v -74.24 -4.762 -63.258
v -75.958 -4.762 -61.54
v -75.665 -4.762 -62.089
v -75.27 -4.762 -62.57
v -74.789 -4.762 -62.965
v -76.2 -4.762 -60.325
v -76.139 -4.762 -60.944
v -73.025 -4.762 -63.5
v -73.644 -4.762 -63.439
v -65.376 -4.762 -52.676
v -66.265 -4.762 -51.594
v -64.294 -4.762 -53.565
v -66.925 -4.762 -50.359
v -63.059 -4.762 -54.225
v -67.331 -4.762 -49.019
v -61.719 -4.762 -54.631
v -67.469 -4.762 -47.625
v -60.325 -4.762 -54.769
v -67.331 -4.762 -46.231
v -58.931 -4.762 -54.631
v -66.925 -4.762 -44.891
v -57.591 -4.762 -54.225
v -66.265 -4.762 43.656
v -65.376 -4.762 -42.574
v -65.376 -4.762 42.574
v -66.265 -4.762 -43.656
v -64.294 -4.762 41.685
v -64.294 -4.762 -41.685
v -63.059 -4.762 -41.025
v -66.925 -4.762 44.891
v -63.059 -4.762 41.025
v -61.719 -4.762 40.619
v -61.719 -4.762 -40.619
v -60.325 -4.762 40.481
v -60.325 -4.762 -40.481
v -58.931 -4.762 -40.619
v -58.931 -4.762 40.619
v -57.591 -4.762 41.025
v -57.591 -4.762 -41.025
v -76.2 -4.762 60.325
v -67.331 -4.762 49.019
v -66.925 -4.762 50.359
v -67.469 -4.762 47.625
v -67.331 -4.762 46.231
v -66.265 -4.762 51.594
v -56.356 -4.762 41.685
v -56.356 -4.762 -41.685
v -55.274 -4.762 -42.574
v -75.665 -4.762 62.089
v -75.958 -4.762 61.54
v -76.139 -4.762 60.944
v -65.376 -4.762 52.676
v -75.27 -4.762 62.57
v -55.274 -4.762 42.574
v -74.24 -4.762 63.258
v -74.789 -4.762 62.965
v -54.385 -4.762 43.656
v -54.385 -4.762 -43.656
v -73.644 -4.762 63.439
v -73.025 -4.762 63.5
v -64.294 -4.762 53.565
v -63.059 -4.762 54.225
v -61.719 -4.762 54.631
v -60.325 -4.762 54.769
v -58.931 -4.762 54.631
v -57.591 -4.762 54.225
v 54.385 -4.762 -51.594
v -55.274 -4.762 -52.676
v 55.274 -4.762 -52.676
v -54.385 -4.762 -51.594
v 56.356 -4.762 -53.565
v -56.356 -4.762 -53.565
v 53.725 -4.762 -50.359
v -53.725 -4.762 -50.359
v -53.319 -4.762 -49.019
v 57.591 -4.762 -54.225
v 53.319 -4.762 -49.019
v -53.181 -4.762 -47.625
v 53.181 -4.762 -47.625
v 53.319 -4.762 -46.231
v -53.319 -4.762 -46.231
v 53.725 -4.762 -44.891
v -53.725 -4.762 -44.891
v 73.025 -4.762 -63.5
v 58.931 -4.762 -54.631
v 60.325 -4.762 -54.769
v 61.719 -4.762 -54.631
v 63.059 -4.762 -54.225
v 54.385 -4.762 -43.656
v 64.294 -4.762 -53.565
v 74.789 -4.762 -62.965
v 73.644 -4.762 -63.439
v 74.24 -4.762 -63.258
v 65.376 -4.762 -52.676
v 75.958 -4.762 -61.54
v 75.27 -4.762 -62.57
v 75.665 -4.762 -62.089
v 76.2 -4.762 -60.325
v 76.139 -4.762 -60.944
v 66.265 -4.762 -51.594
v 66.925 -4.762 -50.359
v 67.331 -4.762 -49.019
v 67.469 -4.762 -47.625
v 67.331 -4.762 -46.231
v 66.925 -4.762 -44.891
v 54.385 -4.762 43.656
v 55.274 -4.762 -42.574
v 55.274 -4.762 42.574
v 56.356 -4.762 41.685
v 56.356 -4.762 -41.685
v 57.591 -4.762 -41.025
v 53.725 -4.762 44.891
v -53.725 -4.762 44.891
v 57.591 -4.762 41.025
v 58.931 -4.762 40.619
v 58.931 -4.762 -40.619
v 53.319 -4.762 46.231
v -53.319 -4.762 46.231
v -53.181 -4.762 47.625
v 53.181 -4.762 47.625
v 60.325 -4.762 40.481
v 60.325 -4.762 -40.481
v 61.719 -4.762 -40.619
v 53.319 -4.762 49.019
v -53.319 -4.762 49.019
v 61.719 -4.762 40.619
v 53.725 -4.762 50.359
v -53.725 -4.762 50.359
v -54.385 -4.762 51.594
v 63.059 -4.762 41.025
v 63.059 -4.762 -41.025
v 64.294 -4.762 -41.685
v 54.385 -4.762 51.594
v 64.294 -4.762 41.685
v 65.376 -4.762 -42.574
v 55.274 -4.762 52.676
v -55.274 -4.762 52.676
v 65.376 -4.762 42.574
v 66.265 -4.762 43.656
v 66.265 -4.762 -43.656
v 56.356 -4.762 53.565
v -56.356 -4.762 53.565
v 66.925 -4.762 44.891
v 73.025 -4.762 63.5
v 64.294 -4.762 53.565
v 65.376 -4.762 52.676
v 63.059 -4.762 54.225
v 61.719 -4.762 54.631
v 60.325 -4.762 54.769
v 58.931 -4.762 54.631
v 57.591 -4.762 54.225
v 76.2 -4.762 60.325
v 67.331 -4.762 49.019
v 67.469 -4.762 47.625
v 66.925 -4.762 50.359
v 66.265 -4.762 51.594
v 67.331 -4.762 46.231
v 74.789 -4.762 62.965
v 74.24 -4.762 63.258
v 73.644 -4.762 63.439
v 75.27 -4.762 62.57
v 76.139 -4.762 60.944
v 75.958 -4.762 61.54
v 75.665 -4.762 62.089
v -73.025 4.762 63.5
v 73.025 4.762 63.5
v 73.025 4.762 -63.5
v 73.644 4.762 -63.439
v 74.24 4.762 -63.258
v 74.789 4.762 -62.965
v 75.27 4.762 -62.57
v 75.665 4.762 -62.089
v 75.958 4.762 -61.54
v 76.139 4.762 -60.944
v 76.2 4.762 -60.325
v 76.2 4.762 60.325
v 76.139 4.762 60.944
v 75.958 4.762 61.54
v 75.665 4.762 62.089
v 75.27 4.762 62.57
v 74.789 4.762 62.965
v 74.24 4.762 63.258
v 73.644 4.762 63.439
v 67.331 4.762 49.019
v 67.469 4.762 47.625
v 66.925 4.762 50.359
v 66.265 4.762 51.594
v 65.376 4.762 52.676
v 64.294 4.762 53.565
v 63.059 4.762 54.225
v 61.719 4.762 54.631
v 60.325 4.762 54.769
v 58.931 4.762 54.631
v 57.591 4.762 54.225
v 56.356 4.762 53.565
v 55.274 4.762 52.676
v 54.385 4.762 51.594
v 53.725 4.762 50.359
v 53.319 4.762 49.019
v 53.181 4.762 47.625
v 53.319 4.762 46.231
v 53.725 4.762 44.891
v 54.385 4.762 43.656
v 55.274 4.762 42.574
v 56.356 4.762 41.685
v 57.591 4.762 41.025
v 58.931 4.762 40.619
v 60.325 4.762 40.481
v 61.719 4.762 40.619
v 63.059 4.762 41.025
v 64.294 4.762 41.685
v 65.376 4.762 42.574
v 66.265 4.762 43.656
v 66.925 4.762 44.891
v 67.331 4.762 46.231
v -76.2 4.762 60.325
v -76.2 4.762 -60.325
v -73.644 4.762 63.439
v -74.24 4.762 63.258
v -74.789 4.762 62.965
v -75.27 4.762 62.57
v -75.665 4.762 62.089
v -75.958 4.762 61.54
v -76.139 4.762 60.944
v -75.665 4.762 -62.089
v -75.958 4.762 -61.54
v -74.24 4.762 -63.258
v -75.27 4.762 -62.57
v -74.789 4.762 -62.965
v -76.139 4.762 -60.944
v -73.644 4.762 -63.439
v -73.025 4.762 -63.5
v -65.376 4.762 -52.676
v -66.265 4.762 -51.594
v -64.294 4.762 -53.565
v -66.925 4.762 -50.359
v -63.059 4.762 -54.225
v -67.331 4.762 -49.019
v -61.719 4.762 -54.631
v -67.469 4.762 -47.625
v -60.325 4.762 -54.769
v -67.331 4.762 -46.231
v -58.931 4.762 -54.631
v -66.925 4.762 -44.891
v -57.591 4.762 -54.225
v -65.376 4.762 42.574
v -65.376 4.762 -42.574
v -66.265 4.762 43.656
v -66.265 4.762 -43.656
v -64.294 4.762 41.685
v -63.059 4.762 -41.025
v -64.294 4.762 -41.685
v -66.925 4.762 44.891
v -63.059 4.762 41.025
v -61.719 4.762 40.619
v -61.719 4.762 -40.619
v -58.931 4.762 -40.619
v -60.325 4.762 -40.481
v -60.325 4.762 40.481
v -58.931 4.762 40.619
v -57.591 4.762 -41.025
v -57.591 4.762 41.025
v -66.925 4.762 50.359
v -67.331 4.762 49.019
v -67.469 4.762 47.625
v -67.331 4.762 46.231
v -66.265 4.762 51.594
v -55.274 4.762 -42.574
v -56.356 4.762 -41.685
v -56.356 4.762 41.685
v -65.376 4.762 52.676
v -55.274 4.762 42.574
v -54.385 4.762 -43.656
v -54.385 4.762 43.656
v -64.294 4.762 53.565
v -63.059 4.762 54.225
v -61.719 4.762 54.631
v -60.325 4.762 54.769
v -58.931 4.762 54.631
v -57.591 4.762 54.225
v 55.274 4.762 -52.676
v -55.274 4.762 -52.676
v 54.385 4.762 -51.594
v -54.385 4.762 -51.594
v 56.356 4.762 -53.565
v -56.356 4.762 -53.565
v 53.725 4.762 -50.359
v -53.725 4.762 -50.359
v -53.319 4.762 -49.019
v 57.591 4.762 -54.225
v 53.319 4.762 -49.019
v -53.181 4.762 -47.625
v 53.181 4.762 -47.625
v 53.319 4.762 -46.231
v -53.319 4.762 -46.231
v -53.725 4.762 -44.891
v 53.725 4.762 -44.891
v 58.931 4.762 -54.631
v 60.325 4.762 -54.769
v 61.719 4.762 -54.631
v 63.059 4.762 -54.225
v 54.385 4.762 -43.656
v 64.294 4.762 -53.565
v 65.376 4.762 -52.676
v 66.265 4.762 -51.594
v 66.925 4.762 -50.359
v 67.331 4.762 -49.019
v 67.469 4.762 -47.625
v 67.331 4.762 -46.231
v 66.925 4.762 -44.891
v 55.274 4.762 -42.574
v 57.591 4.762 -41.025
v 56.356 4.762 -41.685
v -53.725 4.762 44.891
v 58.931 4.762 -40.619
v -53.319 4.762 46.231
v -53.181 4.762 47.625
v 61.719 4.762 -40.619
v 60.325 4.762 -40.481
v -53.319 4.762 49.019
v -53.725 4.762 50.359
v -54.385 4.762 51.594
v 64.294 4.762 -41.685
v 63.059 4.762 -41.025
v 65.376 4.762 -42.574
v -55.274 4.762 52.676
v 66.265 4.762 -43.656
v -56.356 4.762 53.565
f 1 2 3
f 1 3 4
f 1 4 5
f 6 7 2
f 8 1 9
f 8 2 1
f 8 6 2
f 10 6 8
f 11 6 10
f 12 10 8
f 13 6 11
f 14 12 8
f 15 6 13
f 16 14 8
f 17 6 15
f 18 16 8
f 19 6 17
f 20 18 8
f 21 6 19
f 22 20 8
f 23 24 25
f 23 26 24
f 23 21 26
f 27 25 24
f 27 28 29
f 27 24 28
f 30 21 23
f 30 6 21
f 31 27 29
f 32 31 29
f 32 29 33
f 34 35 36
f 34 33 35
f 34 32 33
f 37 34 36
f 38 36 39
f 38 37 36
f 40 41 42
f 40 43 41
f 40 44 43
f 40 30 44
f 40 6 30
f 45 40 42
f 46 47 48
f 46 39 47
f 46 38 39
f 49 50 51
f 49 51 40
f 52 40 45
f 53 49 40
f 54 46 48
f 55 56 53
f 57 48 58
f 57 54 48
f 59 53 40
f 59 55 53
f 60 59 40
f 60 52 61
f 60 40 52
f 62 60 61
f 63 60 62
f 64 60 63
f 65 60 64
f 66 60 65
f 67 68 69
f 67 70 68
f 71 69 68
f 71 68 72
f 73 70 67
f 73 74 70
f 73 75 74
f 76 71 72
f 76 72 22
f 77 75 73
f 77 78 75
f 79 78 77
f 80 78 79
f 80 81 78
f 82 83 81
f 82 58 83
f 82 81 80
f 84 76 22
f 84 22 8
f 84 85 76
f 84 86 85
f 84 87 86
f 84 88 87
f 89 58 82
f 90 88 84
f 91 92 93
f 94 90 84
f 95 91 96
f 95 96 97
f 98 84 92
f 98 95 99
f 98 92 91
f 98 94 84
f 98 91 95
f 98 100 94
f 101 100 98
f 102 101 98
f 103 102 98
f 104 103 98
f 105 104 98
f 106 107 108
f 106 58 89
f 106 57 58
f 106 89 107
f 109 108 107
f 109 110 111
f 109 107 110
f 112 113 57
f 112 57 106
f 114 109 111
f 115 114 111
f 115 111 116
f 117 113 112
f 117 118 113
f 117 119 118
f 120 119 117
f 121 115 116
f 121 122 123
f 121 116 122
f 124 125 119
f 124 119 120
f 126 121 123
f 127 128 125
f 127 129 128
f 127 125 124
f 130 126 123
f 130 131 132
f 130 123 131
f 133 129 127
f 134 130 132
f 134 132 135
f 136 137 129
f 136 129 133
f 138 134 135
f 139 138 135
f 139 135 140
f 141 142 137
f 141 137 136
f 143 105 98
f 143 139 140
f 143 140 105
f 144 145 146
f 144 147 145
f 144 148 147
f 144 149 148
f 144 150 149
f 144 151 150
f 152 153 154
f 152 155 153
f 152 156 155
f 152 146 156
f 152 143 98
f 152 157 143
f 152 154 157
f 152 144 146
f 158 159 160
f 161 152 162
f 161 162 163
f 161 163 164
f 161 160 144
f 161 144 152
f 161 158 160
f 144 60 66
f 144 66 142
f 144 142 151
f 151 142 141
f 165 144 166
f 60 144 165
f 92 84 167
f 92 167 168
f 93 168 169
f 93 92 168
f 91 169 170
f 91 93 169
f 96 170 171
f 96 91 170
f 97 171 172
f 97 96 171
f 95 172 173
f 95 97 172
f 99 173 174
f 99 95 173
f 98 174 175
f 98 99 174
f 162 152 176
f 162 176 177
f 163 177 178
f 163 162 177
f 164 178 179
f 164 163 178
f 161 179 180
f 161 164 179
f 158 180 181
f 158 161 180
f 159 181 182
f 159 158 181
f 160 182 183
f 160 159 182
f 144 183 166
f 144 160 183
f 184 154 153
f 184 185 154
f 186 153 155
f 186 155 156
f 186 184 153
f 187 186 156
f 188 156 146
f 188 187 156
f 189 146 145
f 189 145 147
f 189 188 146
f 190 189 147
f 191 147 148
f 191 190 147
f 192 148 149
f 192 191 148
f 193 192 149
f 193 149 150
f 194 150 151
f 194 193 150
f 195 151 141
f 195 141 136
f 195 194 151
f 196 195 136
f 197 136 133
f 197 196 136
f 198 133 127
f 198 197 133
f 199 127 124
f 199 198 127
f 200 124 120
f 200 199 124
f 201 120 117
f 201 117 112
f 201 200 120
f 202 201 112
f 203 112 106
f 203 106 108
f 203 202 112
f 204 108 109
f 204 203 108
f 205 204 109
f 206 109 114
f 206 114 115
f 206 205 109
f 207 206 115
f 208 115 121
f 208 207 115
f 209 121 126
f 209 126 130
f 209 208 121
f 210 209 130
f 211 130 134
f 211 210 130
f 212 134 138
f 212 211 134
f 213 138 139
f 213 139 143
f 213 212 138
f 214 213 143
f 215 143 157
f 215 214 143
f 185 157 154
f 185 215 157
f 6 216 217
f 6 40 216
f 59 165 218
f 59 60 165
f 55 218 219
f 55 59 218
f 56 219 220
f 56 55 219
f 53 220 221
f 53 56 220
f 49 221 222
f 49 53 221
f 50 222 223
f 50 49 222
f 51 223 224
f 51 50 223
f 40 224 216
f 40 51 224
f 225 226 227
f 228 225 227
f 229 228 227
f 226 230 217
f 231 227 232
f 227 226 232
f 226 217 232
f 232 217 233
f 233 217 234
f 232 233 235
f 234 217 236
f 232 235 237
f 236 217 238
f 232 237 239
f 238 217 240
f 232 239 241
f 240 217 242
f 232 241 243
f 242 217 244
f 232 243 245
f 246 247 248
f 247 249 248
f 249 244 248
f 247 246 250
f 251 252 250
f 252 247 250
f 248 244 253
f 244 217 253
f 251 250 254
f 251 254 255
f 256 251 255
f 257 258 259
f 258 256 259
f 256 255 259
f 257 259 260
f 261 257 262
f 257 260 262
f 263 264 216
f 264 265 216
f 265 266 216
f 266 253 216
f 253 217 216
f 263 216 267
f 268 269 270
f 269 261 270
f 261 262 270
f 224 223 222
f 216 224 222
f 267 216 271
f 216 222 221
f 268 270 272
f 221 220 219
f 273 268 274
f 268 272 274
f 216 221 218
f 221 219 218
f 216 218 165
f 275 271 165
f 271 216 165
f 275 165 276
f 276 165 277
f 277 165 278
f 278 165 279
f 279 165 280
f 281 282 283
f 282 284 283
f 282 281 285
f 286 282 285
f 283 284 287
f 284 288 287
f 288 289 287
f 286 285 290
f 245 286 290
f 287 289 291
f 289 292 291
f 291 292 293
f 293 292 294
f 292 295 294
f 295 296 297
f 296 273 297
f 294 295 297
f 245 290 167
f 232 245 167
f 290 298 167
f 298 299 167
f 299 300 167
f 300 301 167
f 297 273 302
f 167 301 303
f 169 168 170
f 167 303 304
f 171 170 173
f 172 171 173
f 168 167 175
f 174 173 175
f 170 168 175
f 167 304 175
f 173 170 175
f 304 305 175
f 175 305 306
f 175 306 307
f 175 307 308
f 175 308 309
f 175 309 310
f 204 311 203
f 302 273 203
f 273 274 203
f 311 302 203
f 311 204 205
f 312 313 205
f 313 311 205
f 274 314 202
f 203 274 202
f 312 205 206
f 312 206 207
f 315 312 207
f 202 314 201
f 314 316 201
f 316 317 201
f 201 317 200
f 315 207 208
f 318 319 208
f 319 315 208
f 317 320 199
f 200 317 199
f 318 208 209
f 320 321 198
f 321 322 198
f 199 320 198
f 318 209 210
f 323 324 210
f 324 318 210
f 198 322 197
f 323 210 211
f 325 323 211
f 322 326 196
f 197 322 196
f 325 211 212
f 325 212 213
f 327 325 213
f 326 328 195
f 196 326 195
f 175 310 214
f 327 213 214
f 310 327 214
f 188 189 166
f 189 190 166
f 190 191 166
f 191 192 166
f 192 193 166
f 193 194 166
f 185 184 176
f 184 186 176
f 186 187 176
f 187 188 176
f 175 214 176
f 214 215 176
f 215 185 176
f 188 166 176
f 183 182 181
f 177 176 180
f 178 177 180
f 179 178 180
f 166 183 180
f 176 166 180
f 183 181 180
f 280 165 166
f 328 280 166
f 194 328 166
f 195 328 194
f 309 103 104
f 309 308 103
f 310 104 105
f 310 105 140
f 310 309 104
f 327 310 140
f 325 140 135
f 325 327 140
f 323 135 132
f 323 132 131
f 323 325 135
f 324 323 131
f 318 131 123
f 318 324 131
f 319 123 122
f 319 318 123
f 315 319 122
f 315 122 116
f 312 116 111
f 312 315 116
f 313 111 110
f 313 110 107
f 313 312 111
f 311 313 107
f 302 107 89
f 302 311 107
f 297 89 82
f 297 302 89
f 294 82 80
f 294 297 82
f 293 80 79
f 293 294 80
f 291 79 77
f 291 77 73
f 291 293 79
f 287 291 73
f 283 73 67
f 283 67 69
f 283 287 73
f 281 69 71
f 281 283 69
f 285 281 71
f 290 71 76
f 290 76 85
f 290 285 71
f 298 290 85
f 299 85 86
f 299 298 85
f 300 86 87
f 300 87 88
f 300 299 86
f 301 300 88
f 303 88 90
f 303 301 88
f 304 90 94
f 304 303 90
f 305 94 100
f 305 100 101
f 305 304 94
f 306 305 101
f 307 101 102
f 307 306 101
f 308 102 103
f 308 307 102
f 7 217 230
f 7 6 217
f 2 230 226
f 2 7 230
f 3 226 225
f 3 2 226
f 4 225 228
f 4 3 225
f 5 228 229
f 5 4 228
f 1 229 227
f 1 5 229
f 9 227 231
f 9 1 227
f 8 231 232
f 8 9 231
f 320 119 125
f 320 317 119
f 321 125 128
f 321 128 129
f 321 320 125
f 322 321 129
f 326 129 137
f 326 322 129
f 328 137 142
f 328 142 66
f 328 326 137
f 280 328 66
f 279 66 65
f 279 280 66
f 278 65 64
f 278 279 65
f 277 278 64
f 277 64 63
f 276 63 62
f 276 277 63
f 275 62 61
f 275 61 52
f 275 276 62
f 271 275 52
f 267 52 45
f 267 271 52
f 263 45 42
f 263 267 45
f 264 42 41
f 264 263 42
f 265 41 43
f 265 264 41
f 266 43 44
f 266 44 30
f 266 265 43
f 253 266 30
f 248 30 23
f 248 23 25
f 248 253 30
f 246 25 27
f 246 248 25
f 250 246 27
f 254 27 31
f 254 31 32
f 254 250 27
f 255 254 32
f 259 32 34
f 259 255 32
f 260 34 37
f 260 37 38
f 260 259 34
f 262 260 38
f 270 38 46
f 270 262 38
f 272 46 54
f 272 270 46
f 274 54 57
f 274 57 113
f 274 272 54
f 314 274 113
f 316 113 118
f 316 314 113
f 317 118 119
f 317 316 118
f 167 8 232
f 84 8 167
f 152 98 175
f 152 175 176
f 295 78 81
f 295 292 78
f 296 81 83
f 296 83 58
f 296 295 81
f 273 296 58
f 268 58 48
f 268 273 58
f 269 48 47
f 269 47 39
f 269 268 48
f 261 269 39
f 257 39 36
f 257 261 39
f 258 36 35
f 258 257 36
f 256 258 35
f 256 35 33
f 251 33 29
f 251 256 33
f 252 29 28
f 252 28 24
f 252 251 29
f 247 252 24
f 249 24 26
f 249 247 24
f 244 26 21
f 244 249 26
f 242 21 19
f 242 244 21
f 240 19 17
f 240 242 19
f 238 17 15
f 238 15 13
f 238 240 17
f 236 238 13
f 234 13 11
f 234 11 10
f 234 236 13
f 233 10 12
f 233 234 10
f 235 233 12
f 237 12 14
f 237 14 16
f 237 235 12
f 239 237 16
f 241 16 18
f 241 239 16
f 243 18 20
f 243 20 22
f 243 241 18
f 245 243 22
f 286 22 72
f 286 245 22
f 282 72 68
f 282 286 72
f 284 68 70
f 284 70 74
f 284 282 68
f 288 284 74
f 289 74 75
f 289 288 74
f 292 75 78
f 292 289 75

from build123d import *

# Parameters (mm, degrees)
F0_R     = 7.14375
F1_DEPTH = 4.7625


with BuildPart() as f1:
    # F0 (on Front) → F1 (new body, symmetric)
    with BuildSketch(Plane.XZ):
        with BuildLine():
            Line((-73.025, -63.5), (73.025, -63.5))
            ThreePointArc((73.025, -63.5), (75.270064, -62.570064), (76.2, -60.325))
            Line((76.2, -60.325), (76.2, 60.325))
            ThreePointArc((76.2, 60.325), (75.270064, 62.570064), (73.025, 63.5))
            Line((73.025, 63.5), (-73.025, 63.5))
            ThreePointArc((-73.025, 63.5), (-75.270064, 62.570064), (-76.2, 60.325))
            Line((-76.2, 60.325), (-76.2, -60.325))
            ThreePointArc((-76.2, -60.325), (-75.270064, -62.570064), (-73.025, -63.5))
        make_face()
        with Locations((-60.325, -47.625)):
            Circle(F0_R, mode=Mode.SUBTRACT)
        with Locations((60.325, -47.625)):
            Circle(F0_R, mode=Mode.SUBTRACT)
        with Locations((-60.325, 47.625)):
            Circle(F0_R, mode=Mode.SUBTRACT)
        with Locations((60.325, 47.625)):
            Circle(F0_R, mode=Mode.SUBTRACT)
    extrude(amount=F1_DEPTH, both=True)


solid = f1.part
